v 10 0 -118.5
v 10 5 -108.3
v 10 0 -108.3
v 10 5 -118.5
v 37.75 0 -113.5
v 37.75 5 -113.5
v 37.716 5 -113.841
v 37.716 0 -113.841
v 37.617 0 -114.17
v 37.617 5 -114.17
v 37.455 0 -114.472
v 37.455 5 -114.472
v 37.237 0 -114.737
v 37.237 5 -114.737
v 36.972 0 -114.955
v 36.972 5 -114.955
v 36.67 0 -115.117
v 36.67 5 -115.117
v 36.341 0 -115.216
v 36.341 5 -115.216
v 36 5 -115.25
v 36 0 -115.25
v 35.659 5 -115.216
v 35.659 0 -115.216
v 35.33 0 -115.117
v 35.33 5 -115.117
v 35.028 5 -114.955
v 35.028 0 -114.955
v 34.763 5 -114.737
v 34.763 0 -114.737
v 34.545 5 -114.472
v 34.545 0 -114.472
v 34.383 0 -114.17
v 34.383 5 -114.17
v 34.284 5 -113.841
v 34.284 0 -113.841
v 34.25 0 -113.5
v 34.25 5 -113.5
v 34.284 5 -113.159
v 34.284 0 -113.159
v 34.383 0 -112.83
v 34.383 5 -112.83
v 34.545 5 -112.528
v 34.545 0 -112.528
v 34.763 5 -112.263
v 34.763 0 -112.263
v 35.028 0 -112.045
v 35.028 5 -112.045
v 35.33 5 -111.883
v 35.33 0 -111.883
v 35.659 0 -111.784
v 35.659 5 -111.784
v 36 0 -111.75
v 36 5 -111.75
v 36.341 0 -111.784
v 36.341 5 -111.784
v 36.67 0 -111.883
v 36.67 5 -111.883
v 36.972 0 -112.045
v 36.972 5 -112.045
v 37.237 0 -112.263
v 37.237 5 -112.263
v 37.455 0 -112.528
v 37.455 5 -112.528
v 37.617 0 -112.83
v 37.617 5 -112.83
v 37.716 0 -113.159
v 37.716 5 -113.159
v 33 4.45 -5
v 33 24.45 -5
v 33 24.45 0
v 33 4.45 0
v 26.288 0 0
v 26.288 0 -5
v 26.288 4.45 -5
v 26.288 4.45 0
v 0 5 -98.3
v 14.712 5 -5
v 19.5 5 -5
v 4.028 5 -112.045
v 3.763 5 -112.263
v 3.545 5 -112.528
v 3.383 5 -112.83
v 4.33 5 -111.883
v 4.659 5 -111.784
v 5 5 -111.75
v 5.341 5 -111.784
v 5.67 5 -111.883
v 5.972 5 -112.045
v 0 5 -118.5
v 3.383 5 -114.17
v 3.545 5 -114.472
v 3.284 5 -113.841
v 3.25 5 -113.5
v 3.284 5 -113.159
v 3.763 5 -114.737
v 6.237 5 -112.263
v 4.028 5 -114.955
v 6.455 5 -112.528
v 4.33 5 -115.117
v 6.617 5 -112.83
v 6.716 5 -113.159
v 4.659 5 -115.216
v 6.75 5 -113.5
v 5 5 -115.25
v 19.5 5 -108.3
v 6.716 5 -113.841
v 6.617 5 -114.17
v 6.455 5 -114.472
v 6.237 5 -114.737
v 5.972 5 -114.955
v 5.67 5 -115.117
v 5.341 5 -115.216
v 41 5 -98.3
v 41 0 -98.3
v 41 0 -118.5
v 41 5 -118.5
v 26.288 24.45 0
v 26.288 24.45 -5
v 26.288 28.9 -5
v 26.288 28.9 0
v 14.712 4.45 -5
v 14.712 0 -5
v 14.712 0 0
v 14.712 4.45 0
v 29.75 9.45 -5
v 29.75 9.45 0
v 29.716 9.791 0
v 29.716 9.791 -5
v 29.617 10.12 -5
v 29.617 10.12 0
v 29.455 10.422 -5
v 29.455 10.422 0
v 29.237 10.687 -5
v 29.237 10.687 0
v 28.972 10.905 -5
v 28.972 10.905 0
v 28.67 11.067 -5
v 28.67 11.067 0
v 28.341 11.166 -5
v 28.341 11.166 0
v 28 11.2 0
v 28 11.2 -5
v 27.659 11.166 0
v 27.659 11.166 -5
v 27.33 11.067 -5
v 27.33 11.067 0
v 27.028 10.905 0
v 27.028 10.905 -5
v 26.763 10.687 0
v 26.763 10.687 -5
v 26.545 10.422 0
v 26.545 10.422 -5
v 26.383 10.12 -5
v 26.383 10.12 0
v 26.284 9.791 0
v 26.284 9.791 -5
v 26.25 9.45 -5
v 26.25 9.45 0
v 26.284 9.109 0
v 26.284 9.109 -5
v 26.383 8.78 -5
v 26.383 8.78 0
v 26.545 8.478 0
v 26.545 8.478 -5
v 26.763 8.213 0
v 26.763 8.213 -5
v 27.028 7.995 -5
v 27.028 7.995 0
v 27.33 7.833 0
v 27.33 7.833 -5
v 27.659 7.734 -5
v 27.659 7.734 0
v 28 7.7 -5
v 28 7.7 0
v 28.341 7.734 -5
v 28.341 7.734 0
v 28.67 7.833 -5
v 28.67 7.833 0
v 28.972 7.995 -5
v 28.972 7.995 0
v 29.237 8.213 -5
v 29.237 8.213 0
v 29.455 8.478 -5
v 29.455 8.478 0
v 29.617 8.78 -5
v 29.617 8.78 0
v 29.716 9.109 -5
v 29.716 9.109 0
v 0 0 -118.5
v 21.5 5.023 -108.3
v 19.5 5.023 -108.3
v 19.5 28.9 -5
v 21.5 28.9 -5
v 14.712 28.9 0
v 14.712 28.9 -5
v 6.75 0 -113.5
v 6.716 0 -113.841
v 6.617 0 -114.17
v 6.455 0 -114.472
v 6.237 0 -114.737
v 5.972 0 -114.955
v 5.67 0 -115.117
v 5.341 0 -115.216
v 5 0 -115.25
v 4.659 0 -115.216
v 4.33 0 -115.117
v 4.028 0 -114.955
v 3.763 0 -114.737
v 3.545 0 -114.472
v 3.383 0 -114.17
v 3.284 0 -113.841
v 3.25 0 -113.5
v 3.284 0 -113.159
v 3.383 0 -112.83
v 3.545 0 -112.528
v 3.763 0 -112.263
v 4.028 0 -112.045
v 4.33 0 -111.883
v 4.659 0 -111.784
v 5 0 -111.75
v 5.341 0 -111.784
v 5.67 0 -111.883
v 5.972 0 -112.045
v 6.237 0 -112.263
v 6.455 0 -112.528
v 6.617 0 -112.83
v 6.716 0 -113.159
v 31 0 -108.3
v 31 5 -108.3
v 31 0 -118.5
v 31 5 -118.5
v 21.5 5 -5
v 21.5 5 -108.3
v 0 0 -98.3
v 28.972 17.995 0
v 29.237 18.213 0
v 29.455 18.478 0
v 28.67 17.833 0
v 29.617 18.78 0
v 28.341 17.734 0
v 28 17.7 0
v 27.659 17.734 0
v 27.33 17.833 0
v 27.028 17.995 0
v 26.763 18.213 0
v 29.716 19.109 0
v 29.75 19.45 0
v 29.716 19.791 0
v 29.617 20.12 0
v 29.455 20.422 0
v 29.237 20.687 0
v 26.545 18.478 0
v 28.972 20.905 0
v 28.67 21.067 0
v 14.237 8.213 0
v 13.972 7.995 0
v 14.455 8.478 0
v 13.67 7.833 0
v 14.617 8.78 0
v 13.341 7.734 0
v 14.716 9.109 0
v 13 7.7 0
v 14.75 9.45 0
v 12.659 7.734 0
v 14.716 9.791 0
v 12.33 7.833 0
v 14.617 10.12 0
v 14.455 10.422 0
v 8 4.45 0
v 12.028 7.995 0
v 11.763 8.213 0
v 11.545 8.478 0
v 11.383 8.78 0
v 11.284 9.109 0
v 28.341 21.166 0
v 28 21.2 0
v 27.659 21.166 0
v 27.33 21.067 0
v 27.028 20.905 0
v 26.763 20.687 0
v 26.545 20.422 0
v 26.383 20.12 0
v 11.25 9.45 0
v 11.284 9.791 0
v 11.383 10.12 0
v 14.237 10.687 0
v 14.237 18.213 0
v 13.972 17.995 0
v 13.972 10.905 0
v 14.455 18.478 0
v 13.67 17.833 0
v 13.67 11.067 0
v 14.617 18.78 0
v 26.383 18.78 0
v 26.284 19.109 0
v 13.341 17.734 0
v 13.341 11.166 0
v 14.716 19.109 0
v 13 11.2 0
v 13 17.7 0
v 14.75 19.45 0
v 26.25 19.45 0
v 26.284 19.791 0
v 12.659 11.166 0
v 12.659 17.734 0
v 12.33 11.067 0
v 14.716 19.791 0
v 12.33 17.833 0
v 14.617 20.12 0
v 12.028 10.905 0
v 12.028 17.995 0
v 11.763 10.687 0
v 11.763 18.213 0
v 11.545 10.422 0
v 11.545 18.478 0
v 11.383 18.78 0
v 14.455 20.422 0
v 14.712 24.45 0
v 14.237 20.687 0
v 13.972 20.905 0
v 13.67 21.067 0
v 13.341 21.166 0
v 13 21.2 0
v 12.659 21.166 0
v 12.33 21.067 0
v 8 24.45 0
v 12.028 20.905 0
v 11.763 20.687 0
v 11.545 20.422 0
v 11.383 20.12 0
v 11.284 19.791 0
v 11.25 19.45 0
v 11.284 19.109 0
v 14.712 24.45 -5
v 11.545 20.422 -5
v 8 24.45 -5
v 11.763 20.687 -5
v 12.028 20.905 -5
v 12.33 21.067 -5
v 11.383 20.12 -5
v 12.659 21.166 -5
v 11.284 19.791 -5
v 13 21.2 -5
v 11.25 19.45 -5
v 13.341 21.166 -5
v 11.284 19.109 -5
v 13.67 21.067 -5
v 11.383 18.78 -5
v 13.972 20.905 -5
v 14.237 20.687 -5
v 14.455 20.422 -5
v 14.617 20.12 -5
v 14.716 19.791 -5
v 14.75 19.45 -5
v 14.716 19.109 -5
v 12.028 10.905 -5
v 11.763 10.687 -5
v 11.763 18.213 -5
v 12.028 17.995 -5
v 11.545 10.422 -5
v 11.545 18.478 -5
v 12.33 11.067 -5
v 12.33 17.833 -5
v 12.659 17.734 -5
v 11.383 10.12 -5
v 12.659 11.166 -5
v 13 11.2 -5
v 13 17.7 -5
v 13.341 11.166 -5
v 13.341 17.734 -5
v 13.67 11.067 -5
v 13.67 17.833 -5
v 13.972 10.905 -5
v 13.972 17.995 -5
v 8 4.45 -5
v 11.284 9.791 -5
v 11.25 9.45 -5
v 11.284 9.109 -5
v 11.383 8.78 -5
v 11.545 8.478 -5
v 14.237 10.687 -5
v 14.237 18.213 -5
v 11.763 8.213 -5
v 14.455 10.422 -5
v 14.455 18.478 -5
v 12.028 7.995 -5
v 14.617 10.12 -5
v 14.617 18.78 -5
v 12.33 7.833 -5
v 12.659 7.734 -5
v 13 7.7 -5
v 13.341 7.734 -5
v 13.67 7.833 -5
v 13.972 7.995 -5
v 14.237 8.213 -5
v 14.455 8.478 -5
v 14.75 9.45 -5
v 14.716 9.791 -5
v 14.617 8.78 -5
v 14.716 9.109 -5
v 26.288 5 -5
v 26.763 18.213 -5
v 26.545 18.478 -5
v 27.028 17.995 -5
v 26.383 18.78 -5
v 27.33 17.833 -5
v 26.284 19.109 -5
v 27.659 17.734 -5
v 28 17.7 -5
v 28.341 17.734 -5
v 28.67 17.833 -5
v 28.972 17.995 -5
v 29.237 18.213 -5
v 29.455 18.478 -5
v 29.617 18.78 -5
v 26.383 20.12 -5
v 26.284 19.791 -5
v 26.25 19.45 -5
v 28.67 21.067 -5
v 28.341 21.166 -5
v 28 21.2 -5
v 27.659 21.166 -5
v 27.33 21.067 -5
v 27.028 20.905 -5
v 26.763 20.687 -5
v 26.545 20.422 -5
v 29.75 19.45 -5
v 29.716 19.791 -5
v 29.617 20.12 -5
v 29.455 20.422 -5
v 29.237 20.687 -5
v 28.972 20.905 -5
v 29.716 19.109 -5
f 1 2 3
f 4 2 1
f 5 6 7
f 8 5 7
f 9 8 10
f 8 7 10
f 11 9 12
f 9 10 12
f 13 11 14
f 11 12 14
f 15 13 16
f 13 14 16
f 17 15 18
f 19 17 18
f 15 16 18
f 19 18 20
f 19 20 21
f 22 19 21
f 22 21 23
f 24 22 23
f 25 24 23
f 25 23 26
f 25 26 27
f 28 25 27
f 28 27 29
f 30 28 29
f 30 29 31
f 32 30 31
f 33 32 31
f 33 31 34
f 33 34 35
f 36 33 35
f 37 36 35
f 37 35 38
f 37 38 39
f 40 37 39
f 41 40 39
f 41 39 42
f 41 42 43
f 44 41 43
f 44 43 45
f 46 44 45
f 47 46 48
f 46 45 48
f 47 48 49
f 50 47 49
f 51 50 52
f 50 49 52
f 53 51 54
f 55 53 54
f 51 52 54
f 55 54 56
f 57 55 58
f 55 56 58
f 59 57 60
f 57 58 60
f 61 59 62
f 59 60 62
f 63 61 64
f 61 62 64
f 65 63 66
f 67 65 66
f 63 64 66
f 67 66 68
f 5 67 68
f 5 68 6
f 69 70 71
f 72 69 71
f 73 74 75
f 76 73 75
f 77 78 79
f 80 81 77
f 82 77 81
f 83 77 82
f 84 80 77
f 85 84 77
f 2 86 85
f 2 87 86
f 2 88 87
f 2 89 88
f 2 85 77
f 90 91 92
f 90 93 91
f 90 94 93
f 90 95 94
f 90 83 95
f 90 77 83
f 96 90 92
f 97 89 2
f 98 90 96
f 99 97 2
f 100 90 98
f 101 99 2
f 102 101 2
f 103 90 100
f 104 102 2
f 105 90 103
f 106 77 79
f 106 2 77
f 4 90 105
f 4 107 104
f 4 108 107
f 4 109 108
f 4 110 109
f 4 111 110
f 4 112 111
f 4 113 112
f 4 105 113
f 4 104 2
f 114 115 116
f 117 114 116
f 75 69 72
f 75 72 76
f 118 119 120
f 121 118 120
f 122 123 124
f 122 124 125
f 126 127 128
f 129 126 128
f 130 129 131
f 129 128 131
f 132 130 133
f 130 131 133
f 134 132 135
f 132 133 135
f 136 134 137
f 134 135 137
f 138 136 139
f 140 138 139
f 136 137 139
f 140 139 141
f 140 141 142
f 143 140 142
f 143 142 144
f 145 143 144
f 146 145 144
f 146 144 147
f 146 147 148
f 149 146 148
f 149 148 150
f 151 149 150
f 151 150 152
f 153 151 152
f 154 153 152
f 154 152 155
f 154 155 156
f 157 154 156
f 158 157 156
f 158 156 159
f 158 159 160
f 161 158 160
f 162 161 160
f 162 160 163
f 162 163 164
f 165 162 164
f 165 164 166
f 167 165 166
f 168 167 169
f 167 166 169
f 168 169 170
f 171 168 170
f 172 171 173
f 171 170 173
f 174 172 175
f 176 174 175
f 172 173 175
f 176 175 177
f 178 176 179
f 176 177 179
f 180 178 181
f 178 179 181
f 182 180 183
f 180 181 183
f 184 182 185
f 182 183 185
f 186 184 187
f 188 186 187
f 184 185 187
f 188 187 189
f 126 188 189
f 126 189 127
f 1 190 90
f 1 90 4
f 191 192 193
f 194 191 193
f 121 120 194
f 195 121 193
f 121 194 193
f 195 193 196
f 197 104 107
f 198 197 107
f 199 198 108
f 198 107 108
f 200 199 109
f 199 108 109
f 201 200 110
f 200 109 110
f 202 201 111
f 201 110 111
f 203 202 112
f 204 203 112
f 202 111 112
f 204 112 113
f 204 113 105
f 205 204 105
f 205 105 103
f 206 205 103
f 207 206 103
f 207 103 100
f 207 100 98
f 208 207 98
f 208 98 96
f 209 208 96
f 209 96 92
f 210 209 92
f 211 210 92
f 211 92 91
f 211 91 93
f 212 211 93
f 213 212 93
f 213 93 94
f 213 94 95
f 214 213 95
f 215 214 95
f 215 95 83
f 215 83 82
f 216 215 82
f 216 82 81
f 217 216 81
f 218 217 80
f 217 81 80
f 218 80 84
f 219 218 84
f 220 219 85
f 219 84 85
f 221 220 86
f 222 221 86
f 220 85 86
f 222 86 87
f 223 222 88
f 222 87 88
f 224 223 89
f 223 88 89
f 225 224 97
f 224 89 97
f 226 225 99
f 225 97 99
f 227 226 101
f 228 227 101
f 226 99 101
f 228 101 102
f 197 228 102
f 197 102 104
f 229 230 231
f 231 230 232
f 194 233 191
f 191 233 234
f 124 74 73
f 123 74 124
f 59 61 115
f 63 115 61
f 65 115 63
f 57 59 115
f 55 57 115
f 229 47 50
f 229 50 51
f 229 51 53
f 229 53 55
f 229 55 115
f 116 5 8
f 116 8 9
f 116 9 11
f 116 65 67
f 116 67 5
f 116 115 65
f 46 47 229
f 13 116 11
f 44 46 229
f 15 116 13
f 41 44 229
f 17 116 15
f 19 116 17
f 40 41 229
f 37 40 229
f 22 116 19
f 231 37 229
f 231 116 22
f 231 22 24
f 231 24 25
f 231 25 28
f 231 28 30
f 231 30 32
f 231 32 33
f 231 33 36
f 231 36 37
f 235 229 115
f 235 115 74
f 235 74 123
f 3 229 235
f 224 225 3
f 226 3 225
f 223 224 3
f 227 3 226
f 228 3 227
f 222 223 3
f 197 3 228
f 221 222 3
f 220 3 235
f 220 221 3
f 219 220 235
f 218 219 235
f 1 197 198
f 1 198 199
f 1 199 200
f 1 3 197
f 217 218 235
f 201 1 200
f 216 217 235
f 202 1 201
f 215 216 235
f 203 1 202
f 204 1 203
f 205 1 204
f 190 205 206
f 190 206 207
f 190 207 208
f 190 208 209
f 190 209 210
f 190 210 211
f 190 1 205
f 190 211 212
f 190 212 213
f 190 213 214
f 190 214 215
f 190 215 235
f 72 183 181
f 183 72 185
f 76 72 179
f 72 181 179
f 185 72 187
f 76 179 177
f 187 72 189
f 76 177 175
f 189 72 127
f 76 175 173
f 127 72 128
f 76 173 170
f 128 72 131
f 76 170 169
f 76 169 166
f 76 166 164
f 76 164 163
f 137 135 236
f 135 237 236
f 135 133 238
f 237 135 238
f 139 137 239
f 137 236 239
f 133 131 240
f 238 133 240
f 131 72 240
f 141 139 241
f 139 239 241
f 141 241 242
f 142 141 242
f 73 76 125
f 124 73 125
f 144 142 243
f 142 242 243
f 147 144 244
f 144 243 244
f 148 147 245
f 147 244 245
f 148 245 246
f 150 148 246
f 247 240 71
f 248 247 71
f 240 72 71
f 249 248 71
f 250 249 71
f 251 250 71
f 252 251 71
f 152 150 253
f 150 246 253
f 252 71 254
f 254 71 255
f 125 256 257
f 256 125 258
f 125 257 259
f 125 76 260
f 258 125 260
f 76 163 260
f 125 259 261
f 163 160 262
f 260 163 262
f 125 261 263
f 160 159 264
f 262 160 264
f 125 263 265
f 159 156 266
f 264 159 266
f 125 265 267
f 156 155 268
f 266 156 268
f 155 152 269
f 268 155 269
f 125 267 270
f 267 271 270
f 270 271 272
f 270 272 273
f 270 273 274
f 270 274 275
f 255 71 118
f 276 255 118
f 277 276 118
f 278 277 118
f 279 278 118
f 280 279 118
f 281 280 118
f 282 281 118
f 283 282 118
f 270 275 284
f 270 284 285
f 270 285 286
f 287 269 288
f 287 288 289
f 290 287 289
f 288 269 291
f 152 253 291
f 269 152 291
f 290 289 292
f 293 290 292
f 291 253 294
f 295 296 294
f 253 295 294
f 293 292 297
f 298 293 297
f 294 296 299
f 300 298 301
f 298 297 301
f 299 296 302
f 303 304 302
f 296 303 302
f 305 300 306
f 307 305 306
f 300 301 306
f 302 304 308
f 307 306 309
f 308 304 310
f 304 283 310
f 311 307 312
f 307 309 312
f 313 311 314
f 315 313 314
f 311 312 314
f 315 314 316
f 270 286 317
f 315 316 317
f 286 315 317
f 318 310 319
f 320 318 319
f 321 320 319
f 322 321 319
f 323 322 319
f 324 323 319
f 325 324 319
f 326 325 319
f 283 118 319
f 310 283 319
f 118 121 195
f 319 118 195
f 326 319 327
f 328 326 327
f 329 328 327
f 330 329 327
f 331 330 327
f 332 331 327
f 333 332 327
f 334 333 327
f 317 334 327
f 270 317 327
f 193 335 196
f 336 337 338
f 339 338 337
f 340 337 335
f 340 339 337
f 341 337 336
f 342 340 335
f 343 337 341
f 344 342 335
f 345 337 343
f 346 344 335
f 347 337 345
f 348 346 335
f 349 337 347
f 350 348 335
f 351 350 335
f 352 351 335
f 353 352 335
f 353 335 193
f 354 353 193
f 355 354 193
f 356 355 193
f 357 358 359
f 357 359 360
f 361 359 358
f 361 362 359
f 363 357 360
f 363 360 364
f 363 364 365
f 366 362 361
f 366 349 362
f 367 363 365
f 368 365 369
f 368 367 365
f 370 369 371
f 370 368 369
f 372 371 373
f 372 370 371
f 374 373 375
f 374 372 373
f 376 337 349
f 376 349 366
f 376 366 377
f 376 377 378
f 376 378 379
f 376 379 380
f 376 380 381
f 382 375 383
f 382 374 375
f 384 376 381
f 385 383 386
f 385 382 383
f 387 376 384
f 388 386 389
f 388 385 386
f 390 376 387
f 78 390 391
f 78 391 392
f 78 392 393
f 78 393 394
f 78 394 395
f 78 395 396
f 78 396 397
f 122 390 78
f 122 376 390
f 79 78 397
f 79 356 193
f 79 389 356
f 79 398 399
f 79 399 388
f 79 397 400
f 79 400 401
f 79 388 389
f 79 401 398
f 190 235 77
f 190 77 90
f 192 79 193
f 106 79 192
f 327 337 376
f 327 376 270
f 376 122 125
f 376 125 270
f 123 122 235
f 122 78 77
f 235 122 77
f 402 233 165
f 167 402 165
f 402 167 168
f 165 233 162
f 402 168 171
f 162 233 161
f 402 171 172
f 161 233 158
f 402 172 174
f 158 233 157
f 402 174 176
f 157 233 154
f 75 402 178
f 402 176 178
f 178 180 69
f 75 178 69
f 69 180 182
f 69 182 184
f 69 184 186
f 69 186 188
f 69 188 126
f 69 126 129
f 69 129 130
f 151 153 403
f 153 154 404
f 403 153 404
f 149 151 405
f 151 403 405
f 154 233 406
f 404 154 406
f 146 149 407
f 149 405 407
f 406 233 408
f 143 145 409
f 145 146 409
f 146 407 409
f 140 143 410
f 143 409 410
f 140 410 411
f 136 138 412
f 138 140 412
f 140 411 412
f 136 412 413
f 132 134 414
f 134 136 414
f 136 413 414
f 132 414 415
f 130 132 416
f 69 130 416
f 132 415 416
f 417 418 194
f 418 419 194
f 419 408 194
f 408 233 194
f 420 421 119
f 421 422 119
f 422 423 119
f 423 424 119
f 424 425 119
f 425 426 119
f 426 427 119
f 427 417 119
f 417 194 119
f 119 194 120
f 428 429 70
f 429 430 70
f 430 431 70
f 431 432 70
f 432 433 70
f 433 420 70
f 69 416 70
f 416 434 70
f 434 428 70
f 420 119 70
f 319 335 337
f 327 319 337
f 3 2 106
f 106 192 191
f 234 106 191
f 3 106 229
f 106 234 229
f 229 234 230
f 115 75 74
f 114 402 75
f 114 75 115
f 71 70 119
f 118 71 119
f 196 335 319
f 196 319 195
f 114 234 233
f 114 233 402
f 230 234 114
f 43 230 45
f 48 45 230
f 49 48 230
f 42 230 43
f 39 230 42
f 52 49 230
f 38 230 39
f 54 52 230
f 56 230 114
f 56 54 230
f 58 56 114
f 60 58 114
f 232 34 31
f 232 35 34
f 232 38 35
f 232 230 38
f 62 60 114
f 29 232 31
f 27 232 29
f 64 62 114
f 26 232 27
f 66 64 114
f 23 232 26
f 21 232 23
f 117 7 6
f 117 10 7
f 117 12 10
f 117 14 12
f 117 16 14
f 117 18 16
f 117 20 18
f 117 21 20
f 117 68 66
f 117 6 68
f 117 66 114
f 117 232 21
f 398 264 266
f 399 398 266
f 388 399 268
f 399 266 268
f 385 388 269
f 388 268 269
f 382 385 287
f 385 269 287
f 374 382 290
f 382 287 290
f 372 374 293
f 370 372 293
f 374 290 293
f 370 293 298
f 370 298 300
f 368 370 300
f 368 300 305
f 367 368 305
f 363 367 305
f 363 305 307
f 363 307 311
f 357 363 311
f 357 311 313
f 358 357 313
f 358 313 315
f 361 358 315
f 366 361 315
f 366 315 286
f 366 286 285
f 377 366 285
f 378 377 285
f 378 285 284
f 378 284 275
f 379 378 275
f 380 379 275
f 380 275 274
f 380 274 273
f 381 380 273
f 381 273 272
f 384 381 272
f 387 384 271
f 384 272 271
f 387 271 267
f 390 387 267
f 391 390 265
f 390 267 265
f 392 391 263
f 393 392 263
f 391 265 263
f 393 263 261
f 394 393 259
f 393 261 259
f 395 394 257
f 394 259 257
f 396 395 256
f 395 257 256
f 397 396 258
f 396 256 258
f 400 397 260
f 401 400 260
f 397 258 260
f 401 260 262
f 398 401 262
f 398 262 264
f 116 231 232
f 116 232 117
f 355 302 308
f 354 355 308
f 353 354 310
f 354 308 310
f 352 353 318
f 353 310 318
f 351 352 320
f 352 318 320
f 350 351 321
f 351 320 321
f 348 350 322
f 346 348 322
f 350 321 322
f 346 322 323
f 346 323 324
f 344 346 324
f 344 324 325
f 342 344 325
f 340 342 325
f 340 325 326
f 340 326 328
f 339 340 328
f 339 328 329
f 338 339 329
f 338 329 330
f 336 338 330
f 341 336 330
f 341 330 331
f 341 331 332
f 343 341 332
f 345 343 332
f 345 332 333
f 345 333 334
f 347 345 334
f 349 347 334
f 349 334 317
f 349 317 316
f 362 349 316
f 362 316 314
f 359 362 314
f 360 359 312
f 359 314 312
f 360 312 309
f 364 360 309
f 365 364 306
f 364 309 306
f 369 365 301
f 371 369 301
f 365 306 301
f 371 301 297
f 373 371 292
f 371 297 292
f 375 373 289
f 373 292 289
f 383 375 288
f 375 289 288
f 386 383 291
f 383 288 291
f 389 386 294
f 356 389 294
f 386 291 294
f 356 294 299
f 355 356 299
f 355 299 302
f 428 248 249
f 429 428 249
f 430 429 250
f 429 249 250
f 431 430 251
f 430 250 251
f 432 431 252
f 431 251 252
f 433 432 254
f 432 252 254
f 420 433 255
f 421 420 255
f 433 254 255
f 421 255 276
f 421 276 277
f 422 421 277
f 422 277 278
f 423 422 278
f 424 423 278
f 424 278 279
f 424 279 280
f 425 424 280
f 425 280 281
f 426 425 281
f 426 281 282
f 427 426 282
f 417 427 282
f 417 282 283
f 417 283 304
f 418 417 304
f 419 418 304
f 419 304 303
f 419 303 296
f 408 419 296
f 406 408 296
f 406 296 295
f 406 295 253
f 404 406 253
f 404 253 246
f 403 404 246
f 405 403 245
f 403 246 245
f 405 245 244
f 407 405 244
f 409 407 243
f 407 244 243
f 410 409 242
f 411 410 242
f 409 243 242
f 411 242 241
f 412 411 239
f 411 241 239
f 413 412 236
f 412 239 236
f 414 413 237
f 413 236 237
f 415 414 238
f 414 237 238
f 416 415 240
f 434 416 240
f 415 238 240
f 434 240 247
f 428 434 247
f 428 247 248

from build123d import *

# Parameters (mm, degrees)
SKETCH1_W           = 41
SKETCH1_H           = 118.5
BOSS_EXTRUDE1_DEPTH = 5
SKETCH2_W           = 21
SKETCH2_H           = 10.2
CUT_EXTRUDE1_DEPTH  = 6
SKETCH9_R           = 1.75
CUT_EXTRUDE4_DEPTH  = 6
CUT_EXTRUDE5_DEPTH  = 6
BOSS_EXTRUDE4_DEPTH = 23.9
SKETCH16_W          = 2
SKETCH16_H          = 103.3
BOSS_EXTRUDE5_DEPTH = 23.9
CUT_EXTRUDE8_DEPTH  = 22.5
BOSS_EXTRUDE6_DEPTH = 28.9
SKETCH25_W          = 6.711597152
SKETCH25_H          = 4.45
CUT_EXTRUDE9_DEPTH  = 6
SKETCH26_R          = 1.75
CUT_EXTRUDE10_DEPTH = 119.5


with BuildPart() as part:
    # Sketch1 → Boss-Extrude1 (new body)
    with BuildSketch(Plane(origin=(0, 0, 0), x_dir=(1, 0, 0), z_dir=(0, 1, 0))):
        with Locations((20.5, 59.25)):
            Rectangle(SKETCH1_W, SKETCH1_H)
    extrude(amount=BOSS_EXTRUDE1_DEPTH)

    # Sketch2 → Cut-Extrude1 (cut, through all)
    with BuildSketch(Plane(origin=(0, 5, 0), x_dir=(1, 0, 0), z_dir=(0, 1, 0))):
        with Locations((20.5, 113.4)):
            Rectangle(SKETCH2_W, SKETCH2_H)
    extrude(amount=-CUT_EXTRUDE1_DEPTH, mode=Mode.SUBTRACT)

    # Sketch9 → Cut-Extrude4 (cut, through all)
    with BuildSketch(Plane(origin=(0, 5, 0), x_dir=(1, 0, 0), z_dir=(0, 1, 0))):
        with Locations((5, 113.5)):
            Circle(SKETCH9_R)
        with Locations((36, 113.5)):
            Circle(SKETCH9_R)
    extrude(amount=-CUT_EXTRUDE4_DEPTH, mode=Mode.SUBTRACT)

    # Sketch11 → Cut-Extrude5 (cut, through all)
    with BuildSketch(Plane(origin=(0, 5, 0), x_dir=(1, 0, 0), z_dir=(0, 1, 0))):
        Polygon((15.5, 0), (0, 98.3), (0, 0), align=None)
        Polygon((25.5, 0), (41, 98.3), (41, 0), align=None)
    extrude(amount=-CUT_EXTRUDE5_DEPTH, mode=Mode.SUBTRACT)

    # Sketch12 → Boss-Extrude4 (add)
    with BuildSketch(Plane(origin=(0, 5, 0), x_dir=(1, 0, 0), z_dir=(0, 1, 0))):
        Polygon((25.5, 0), (15.5, 0), (14.711597152, 5), (26.288402848, 5), align=None)
    extrude(amount=BOSS_EXTRUDE4_DEPTH)

    # Sketch16 → Boss-Extrude5 (add)
    with BuildSketch(Plane(origin=(0, 5, 0), x_dir=(1, 0, 0), z_dir=(0, 1, 0))):
        with Locations((20.5, 56.65)):
            Rectangle(SKETCH16_W, SKETCH16_H)
    extrude(amount=BOSS_EXTRUDE5_DEPTH)

    # Sketch17 → Cut-Extrude8 (cut, through all)
    with BuildSketch(Plane.ZY.offset(-19.5)):
        Polygon((-108.4, 5), (-5, 28.9), (-108.3, 28.9), align=None)
    extrude(amount=-CUT_EXTRUDE8_DEPTH, mode=Mode.SUBTRACT)

    # Sketch23 → Boss-Extrude6 (add)
    with BuildSketch(Plane(origin=(0, 28.9, 0), x_dir=(1, 0, 0), z_dir=(0, 1, 0))):
        Polygon((26.288402848, 5), (33, 5), (33, 0), (25.5, 0), align=None)
        Polygon((14.711597152, 5), (8, 5), (8, 0), (15.5, 0), align=None)
    extrude(amount=-BOSS_EXTRUDE6_DEPTH)

    # Sketch25 → Cut-Extrude9 (cut, through all)
    with BuildSketch(Plane(origin=(0, 0, -5), x_dir=(-1, 0, 0), z_dir=(0, 0, -1))):
        with Locations((-11.355798576, 2.225)):
            Rectangle(SKETCH25_W, SKETCH25_H)
        with Locations((-29.644201424, 2.225)):
            Rectangle(SKETCH25_W, SKETCH25_H)
        with Locations((-11.355798576, 26.675)):
            Rectangle(SKETCH25_W, SKETCH25_H)
        with Locations((-29.644201424, 26.675)):
            Rectangle(SKETCH25_W, SKETCH25_H)
    extrude(amount=-CUT_EXTRUDE9_DEPTH, mode=Mode.SUBTRACT)

    # Sketch26 → Cut-Extrude10 (cut, through all)
    with BuildSketch(Plane.XY):
        with Locations((13, 19.45)):
            Circle(SKETCH26_R)
        with Locations((28, 19.45)):
            Circle(SKETCH26_R)
        with Locations((13, 9.45)):
            Circle(SKETCH26_R)
        with Locations((28, 9.45)):
            Circle(SKETCH26_R)
    extrude(amount=-CUT_EXTRUDE10_DEPTH, mode=Mode.SUBTRACT)


solid = part.part
